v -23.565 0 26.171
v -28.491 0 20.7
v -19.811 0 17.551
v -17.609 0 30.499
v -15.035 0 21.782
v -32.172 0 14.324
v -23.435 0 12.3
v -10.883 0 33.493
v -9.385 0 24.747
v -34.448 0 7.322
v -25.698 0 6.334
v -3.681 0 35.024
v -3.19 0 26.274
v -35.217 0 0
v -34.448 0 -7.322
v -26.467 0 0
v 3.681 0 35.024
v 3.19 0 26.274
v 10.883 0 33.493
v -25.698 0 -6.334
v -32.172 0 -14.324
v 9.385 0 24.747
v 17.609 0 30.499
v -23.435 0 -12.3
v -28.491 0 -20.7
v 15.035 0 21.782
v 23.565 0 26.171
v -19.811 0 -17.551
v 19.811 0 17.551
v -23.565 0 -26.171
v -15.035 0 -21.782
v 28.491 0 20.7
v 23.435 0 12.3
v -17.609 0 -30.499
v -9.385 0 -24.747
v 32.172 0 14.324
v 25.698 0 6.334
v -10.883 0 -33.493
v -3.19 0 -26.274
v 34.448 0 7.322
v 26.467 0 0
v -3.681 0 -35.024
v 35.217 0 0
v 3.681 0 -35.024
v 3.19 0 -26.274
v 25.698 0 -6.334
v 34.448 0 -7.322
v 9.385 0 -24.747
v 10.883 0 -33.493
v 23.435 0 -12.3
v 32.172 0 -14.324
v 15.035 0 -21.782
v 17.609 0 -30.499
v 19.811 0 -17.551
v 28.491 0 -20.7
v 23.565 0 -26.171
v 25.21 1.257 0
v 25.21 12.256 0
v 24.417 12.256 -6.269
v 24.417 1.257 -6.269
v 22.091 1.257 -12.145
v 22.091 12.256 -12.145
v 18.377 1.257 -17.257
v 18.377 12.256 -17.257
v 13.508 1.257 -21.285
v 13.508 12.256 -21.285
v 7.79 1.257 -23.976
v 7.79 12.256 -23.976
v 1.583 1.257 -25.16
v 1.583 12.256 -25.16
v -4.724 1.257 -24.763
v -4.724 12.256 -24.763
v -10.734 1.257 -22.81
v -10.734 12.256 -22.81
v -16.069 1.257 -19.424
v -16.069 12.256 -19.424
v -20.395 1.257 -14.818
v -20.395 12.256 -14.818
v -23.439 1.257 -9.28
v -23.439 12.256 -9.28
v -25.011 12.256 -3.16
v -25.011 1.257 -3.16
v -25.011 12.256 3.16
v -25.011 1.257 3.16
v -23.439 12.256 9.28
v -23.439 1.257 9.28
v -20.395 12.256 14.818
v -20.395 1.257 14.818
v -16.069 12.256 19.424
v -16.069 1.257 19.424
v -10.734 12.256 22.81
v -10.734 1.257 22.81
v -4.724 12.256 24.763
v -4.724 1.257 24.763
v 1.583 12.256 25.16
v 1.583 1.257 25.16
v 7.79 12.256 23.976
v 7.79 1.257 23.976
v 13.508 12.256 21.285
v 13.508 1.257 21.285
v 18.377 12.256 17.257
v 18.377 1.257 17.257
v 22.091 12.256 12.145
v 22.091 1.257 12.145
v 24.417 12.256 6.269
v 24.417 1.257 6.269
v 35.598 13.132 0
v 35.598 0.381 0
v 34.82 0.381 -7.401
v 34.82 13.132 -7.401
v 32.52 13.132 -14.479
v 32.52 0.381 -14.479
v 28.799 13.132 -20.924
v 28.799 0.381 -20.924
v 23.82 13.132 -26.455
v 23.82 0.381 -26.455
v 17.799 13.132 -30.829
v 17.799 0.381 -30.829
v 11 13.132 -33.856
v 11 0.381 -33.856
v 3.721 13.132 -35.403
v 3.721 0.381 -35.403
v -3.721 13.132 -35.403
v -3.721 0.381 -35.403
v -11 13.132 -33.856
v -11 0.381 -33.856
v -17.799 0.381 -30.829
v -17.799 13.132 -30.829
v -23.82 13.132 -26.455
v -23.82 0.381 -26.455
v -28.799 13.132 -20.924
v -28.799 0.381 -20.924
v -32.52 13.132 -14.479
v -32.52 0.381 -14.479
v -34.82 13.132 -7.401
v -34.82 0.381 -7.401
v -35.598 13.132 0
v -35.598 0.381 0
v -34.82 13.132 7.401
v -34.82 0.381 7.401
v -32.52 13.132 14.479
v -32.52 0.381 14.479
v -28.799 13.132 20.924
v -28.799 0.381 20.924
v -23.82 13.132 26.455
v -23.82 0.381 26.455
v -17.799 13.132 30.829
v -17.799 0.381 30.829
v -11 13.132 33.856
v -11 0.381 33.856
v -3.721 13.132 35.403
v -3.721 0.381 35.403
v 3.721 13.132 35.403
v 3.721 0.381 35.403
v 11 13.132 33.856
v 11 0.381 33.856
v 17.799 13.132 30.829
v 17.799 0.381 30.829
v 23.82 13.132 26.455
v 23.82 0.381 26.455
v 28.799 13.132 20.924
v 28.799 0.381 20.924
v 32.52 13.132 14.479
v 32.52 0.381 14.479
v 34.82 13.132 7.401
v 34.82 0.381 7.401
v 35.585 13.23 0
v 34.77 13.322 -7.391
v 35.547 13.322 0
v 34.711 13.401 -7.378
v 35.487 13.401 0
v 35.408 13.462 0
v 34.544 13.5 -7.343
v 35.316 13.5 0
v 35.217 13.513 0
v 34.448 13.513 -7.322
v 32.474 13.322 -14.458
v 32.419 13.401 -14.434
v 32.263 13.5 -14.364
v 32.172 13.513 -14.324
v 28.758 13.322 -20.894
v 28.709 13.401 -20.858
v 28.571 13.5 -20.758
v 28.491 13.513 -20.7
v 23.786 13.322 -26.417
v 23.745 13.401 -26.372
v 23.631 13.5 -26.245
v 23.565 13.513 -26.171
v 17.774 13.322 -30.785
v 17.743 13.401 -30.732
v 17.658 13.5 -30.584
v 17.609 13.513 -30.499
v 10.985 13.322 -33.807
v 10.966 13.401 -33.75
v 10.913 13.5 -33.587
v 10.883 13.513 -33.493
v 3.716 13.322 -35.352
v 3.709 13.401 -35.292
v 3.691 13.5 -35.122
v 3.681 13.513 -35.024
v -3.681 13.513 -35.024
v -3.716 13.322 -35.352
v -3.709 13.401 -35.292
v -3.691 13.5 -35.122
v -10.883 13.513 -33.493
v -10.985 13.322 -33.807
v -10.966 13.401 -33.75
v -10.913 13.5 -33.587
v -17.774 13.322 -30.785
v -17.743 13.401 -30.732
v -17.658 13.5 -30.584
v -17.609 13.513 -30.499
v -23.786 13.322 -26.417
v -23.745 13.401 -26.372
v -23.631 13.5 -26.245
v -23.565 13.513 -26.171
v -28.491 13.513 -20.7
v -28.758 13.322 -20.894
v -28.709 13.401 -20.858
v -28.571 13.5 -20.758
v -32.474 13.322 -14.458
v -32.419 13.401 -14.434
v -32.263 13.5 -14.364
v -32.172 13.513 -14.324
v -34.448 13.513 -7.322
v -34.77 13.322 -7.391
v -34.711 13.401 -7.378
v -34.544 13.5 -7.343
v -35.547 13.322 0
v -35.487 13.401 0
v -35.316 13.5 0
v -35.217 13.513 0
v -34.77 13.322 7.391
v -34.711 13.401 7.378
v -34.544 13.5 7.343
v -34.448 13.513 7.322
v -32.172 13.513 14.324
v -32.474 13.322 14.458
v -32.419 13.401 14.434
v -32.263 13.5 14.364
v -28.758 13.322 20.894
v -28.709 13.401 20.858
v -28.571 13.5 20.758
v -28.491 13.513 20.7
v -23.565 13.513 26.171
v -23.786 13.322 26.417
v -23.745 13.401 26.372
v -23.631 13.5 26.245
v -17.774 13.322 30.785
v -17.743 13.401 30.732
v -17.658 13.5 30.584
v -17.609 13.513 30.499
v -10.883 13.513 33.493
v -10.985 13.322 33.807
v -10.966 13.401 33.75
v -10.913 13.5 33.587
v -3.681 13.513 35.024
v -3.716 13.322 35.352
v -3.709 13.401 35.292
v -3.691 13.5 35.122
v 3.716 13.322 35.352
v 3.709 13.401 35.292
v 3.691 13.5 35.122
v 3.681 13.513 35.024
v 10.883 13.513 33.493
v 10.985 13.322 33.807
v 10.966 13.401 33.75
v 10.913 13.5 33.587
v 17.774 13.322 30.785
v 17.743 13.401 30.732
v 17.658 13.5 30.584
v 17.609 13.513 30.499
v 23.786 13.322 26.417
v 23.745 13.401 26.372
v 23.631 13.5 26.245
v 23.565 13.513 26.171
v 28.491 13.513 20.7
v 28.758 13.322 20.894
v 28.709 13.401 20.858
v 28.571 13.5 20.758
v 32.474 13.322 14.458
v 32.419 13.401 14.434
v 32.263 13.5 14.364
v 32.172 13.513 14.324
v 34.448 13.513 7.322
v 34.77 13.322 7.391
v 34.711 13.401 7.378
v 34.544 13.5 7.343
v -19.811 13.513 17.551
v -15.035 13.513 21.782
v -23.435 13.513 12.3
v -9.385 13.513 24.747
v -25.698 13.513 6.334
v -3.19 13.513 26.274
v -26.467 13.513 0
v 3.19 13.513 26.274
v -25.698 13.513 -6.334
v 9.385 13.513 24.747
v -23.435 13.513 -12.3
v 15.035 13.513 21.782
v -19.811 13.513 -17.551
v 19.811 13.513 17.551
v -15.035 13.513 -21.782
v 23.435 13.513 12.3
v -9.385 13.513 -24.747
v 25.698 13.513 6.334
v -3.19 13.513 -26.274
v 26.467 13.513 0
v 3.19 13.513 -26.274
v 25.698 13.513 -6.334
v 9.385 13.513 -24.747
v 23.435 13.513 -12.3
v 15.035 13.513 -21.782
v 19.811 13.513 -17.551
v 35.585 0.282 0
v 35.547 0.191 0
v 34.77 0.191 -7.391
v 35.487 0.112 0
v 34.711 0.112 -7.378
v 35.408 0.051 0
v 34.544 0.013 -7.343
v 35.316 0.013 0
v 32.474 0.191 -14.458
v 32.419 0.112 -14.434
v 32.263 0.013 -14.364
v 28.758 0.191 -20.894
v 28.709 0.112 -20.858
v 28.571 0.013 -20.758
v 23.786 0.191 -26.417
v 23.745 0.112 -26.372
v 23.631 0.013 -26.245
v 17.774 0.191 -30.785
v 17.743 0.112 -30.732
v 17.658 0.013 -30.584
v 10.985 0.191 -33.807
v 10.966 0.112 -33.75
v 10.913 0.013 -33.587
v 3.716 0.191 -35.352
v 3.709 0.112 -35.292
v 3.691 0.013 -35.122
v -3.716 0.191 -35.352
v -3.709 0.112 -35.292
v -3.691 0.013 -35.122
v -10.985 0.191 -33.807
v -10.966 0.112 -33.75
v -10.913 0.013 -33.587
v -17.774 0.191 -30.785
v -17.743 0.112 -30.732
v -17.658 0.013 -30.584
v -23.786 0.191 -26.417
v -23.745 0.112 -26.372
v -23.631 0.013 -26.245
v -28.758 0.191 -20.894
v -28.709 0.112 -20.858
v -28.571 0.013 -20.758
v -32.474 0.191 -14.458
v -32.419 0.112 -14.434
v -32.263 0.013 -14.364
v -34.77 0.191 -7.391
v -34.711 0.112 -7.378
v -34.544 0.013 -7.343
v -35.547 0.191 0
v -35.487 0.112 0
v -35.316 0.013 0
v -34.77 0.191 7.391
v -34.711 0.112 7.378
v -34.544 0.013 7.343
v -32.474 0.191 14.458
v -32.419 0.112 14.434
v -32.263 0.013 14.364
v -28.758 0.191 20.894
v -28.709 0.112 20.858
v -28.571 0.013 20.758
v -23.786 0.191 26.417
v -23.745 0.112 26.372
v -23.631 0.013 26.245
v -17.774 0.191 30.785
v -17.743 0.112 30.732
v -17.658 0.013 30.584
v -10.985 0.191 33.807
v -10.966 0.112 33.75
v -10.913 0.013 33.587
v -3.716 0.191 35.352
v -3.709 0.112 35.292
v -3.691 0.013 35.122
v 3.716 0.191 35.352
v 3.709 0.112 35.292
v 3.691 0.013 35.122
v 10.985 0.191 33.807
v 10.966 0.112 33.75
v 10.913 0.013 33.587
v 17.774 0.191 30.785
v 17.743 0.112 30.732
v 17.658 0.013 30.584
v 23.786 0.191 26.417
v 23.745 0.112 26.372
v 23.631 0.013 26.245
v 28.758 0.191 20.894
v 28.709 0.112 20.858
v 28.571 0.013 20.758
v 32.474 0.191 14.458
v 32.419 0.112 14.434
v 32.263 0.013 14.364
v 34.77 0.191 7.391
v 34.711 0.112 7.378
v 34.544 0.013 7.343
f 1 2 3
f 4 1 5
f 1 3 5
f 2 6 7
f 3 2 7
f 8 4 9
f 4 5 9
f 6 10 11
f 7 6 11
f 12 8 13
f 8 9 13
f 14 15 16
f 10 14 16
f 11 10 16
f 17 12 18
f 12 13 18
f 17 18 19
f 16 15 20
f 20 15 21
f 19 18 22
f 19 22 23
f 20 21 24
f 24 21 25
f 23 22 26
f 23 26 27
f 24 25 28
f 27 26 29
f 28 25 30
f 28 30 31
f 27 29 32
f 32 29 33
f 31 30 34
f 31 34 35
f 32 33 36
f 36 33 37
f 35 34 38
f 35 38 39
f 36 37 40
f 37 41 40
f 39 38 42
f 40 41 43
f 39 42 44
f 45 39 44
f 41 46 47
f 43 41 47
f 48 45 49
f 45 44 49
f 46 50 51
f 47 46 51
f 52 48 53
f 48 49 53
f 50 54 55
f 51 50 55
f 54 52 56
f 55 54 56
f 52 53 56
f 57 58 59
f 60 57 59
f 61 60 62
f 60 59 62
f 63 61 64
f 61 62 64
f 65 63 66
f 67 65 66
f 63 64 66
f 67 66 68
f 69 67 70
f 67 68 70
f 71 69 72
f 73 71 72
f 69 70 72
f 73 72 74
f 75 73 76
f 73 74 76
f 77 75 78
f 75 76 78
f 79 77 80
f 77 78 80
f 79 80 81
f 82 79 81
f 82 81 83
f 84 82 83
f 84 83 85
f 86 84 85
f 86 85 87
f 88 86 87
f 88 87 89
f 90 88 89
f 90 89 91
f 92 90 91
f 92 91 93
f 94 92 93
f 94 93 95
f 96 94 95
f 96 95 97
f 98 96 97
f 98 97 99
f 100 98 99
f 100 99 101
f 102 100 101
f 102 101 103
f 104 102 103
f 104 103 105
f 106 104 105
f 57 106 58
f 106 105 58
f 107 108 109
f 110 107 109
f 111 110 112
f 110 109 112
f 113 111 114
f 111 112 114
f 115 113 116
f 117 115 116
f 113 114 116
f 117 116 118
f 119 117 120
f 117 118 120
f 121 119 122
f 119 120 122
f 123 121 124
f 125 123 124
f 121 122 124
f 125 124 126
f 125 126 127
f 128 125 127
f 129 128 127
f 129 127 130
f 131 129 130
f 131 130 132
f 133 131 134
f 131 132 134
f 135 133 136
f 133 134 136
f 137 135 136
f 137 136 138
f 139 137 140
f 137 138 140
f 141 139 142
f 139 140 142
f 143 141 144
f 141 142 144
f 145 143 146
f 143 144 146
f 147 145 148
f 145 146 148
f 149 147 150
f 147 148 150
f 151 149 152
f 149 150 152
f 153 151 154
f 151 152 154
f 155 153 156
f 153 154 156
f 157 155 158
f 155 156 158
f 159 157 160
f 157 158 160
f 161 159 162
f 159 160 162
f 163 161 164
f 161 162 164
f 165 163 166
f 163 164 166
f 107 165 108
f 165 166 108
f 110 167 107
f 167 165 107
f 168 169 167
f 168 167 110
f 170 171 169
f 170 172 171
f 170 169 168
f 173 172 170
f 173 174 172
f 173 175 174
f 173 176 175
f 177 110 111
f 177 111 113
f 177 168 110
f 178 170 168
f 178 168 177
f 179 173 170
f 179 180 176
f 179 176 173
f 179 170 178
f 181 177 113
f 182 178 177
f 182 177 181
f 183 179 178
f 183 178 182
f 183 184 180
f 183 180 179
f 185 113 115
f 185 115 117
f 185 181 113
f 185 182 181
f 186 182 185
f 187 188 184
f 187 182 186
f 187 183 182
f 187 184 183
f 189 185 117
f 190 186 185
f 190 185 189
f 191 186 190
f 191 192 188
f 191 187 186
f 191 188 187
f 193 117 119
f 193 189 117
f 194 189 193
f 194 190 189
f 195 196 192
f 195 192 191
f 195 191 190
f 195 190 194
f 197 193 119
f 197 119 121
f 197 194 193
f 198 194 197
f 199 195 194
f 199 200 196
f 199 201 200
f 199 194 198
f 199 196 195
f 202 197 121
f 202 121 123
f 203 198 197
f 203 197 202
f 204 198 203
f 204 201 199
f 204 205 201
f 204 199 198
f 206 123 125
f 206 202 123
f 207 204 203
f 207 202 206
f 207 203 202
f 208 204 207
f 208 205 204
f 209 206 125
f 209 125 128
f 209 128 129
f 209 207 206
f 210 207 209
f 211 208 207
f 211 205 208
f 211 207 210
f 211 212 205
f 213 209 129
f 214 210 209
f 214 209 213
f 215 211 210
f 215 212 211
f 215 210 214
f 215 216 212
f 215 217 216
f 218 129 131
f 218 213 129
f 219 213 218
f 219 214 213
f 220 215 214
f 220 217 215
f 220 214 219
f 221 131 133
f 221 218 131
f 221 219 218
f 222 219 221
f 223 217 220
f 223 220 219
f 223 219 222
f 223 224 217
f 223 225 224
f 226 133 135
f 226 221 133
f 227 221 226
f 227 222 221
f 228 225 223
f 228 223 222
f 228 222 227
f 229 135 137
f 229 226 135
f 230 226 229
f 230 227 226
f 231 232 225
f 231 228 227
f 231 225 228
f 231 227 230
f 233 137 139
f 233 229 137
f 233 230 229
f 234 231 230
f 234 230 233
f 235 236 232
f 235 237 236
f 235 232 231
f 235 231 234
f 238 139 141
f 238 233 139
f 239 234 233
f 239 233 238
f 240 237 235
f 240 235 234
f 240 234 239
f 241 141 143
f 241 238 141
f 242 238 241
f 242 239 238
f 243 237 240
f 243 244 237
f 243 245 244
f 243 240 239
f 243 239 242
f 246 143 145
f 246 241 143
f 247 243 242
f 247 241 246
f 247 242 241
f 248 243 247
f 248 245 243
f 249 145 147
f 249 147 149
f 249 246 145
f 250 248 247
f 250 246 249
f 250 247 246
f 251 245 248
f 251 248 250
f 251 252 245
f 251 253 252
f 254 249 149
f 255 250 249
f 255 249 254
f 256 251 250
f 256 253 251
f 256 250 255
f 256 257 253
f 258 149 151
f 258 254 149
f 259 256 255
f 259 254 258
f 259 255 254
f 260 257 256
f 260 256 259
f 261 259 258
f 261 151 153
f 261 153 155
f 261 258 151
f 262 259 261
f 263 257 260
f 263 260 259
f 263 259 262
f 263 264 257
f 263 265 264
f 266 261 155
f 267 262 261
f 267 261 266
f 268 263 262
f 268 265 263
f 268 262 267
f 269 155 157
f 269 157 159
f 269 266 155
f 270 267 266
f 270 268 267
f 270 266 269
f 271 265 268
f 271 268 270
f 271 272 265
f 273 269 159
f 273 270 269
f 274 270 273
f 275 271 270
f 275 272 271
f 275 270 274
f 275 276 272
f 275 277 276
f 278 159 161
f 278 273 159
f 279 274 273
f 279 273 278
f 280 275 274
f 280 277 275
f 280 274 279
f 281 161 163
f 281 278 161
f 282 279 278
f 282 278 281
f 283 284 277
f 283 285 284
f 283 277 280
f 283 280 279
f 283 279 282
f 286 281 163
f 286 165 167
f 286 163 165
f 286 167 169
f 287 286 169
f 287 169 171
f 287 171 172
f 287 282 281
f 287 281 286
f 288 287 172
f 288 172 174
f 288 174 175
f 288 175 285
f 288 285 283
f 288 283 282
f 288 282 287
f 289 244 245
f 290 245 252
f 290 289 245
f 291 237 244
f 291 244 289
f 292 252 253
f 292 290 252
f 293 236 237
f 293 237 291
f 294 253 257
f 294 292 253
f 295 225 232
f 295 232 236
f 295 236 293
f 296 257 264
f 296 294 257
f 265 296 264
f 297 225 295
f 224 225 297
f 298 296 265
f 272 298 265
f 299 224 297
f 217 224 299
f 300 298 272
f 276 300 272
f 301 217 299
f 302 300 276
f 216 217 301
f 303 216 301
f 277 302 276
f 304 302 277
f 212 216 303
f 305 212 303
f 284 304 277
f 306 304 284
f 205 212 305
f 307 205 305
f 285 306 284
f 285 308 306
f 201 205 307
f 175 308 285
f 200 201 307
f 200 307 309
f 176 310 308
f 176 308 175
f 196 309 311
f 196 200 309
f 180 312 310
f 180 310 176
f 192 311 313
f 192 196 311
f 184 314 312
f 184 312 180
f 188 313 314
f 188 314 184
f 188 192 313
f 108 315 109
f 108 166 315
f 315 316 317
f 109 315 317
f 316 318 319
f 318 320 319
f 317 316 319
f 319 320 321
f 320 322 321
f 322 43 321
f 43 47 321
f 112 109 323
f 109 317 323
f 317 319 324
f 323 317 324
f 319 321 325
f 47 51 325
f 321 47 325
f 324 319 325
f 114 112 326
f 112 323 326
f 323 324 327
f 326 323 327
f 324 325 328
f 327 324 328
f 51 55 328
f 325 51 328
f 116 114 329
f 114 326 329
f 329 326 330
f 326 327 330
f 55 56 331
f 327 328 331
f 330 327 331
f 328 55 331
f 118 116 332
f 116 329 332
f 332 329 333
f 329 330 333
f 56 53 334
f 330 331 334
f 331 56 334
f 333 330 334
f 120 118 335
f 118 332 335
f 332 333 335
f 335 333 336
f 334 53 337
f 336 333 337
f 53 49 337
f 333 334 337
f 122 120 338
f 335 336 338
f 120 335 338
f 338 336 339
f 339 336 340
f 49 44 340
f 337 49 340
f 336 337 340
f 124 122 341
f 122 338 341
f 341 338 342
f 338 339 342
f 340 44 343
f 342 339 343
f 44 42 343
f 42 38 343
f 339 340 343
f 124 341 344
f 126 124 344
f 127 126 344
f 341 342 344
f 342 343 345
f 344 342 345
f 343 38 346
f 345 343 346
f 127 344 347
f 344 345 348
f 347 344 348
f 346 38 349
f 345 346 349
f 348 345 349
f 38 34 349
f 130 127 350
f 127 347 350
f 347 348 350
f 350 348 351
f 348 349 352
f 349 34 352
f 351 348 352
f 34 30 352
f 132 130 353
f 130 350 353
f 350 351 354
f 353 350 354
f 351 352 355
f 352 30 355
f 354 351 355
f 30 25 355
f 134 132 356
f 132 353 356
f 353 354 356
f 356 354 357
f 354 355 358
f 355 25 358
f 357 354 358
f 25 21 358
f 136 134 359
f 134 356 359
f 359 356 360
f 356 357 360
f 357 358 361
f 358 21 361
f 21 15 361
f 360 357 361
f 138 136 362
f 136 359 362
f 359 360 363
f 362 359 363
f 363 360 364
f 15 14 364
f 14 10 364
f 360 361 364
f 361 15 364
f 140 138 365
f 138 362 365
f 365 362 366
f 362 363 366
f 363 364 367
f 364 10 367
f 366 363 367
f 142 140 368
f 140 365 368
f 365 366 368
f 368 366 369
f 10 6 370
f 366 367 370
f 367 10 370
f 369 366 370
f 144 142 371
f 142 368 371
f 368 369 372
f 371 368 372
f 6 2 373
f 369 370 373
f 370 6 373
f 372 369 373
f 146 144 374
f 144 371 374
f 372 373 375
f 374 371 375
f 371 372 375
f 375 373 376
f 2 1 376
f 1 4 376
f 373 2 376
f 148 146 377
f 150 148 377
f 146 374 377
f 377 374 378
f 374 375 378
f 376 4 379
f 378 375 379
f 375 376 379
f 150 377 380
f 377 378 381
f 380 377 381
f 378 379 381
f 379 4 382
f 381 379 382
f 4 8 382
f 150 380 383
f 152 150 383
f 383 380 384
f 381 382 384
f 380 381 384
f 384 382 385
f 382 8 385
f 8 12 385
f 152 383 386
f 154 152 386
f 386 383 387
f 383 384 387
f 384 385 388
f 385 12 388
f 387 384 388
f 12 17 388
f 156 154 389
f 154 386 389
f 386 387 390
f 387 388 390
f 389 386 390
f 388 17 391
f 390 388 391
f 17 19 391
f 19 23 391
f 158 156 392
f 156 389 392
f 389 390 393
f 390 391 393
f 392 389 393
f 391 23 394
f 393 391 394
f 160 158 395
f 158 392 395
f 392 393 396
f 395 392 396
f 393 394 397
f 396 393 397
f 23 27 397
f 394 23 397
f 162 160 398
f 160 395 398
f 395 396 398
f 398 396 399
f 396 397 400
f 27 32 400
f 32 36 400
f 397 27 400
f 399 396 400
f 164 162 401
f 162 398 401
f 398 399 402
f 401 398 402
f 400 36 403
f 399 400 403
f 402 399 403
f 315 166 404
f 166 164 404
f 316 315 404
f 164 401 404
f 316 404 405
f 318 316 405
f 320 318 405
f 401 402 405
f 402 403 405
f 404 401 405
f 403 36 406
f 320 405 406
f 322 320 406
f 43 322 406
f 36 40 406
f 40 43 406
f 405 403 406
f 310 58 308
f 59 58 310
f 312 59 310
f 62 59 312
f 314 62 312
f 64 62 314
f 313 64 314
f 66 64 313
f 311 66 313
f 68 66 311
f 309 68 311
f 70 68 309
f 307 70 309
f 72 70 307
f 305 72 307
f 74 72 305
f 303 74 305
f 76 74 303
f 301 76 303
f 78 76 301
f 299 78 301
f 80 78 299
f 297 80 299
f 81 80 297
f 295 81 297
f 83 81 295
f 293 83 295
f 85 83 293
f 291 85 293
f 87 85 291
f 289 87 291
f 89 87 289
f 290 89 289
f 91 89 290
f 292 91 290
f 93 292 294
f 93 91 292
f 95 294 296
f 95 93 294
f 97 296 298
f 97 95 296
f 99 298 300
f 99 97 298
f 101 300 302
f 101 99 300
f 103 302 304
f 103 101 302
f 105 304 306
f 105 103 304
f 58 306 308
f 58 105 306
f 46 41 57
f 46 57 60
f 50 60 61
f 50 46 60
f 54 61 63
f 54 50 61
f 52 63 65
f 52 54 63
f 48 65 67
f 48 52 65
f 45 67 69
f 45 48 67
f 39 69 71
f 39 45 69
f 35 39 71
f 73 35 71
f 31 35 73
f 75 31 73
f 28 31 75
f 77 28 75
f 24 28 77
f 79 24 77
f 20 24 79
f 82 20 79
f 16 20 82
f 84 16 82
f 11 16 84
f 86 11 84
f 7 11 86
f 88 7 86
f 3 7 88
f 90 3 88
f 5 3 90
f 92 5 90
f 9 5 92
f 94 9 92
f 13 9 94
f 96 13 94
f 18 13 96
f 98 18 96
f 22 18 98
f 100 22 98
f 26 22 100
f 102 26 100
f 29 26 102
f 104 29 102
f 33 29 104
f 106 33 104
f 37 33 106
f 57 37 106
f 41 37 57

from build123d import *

# Parameters (mm, degrees)
SKETCH1_R           = 35.5981
BOSS_EXTRUDE1_DEPTH = 13.5128
SKETCH2_R           = 25.2095
CUT_EXTRUDE1_DEPTH  = 40.64
FILLET1_R           = 0.381
FILLET2_R           = 0.381
CHAMFER1_SIZE       = 1.2573
CHAMFER2_SIZE       = 1.2573


with BuildPart() as part:
    # Sketch1 → Boss-Extrude1 (new body)
    with BuildSketch(Plane(origin=(0, 0, 0), x_dir=(1, 0, 0), z_dir=(0, 1, 0))):
        Circle(SKETCH1_R)
    extrude(amount=BOSS_EXTRUDE1_DEPTH)

    # Sketch2 → Cut-Extrude1 (cut)
    with BuildSketch(Plane(origin=(0, 13.5128, 0), x_dir=(1, 0, 0), z_dir=(0, 1, 0))):
        Circle(SKETCH2_R)
    extrude(amount=-CUT_EXTRUDE1_DEPTH, mode=Mode.SUBTRACT)

    # Fillet1
    fillet1_edges = [part.edges().sort_by_distance(p)[0] for p in [
        (-35.5981, 13.5128, 0),
    ]]
    fillet(fillet1_edges, radius=FILLET1_R)

    # Fillet2
    fillet2_edges = [part.edges().sort_by_distance(p)[0] for p in [
        (-35.5981, 0, 0),
    ]]
    fillet(fillet2_edges, radius=FILLET2_R)

    # Chamfer1
    chamfer1_edges = [part.edges().sort_by_distance(p)[0] for p in [
        (-25.2095, 13.5128, 0),
    ]]
    chamfer(chamfer1_edges, length=CHAMFER1_SIZE)

    # Chamfer2
    chamfer2_edges = [part.edges().sort_by_distance(p)[0] for p in [
        (-25.2095, 0, 0),
    ]]
    chamfer(chamfer2_edges, length=CHAMFER2_SIZE)


solid = part.part
